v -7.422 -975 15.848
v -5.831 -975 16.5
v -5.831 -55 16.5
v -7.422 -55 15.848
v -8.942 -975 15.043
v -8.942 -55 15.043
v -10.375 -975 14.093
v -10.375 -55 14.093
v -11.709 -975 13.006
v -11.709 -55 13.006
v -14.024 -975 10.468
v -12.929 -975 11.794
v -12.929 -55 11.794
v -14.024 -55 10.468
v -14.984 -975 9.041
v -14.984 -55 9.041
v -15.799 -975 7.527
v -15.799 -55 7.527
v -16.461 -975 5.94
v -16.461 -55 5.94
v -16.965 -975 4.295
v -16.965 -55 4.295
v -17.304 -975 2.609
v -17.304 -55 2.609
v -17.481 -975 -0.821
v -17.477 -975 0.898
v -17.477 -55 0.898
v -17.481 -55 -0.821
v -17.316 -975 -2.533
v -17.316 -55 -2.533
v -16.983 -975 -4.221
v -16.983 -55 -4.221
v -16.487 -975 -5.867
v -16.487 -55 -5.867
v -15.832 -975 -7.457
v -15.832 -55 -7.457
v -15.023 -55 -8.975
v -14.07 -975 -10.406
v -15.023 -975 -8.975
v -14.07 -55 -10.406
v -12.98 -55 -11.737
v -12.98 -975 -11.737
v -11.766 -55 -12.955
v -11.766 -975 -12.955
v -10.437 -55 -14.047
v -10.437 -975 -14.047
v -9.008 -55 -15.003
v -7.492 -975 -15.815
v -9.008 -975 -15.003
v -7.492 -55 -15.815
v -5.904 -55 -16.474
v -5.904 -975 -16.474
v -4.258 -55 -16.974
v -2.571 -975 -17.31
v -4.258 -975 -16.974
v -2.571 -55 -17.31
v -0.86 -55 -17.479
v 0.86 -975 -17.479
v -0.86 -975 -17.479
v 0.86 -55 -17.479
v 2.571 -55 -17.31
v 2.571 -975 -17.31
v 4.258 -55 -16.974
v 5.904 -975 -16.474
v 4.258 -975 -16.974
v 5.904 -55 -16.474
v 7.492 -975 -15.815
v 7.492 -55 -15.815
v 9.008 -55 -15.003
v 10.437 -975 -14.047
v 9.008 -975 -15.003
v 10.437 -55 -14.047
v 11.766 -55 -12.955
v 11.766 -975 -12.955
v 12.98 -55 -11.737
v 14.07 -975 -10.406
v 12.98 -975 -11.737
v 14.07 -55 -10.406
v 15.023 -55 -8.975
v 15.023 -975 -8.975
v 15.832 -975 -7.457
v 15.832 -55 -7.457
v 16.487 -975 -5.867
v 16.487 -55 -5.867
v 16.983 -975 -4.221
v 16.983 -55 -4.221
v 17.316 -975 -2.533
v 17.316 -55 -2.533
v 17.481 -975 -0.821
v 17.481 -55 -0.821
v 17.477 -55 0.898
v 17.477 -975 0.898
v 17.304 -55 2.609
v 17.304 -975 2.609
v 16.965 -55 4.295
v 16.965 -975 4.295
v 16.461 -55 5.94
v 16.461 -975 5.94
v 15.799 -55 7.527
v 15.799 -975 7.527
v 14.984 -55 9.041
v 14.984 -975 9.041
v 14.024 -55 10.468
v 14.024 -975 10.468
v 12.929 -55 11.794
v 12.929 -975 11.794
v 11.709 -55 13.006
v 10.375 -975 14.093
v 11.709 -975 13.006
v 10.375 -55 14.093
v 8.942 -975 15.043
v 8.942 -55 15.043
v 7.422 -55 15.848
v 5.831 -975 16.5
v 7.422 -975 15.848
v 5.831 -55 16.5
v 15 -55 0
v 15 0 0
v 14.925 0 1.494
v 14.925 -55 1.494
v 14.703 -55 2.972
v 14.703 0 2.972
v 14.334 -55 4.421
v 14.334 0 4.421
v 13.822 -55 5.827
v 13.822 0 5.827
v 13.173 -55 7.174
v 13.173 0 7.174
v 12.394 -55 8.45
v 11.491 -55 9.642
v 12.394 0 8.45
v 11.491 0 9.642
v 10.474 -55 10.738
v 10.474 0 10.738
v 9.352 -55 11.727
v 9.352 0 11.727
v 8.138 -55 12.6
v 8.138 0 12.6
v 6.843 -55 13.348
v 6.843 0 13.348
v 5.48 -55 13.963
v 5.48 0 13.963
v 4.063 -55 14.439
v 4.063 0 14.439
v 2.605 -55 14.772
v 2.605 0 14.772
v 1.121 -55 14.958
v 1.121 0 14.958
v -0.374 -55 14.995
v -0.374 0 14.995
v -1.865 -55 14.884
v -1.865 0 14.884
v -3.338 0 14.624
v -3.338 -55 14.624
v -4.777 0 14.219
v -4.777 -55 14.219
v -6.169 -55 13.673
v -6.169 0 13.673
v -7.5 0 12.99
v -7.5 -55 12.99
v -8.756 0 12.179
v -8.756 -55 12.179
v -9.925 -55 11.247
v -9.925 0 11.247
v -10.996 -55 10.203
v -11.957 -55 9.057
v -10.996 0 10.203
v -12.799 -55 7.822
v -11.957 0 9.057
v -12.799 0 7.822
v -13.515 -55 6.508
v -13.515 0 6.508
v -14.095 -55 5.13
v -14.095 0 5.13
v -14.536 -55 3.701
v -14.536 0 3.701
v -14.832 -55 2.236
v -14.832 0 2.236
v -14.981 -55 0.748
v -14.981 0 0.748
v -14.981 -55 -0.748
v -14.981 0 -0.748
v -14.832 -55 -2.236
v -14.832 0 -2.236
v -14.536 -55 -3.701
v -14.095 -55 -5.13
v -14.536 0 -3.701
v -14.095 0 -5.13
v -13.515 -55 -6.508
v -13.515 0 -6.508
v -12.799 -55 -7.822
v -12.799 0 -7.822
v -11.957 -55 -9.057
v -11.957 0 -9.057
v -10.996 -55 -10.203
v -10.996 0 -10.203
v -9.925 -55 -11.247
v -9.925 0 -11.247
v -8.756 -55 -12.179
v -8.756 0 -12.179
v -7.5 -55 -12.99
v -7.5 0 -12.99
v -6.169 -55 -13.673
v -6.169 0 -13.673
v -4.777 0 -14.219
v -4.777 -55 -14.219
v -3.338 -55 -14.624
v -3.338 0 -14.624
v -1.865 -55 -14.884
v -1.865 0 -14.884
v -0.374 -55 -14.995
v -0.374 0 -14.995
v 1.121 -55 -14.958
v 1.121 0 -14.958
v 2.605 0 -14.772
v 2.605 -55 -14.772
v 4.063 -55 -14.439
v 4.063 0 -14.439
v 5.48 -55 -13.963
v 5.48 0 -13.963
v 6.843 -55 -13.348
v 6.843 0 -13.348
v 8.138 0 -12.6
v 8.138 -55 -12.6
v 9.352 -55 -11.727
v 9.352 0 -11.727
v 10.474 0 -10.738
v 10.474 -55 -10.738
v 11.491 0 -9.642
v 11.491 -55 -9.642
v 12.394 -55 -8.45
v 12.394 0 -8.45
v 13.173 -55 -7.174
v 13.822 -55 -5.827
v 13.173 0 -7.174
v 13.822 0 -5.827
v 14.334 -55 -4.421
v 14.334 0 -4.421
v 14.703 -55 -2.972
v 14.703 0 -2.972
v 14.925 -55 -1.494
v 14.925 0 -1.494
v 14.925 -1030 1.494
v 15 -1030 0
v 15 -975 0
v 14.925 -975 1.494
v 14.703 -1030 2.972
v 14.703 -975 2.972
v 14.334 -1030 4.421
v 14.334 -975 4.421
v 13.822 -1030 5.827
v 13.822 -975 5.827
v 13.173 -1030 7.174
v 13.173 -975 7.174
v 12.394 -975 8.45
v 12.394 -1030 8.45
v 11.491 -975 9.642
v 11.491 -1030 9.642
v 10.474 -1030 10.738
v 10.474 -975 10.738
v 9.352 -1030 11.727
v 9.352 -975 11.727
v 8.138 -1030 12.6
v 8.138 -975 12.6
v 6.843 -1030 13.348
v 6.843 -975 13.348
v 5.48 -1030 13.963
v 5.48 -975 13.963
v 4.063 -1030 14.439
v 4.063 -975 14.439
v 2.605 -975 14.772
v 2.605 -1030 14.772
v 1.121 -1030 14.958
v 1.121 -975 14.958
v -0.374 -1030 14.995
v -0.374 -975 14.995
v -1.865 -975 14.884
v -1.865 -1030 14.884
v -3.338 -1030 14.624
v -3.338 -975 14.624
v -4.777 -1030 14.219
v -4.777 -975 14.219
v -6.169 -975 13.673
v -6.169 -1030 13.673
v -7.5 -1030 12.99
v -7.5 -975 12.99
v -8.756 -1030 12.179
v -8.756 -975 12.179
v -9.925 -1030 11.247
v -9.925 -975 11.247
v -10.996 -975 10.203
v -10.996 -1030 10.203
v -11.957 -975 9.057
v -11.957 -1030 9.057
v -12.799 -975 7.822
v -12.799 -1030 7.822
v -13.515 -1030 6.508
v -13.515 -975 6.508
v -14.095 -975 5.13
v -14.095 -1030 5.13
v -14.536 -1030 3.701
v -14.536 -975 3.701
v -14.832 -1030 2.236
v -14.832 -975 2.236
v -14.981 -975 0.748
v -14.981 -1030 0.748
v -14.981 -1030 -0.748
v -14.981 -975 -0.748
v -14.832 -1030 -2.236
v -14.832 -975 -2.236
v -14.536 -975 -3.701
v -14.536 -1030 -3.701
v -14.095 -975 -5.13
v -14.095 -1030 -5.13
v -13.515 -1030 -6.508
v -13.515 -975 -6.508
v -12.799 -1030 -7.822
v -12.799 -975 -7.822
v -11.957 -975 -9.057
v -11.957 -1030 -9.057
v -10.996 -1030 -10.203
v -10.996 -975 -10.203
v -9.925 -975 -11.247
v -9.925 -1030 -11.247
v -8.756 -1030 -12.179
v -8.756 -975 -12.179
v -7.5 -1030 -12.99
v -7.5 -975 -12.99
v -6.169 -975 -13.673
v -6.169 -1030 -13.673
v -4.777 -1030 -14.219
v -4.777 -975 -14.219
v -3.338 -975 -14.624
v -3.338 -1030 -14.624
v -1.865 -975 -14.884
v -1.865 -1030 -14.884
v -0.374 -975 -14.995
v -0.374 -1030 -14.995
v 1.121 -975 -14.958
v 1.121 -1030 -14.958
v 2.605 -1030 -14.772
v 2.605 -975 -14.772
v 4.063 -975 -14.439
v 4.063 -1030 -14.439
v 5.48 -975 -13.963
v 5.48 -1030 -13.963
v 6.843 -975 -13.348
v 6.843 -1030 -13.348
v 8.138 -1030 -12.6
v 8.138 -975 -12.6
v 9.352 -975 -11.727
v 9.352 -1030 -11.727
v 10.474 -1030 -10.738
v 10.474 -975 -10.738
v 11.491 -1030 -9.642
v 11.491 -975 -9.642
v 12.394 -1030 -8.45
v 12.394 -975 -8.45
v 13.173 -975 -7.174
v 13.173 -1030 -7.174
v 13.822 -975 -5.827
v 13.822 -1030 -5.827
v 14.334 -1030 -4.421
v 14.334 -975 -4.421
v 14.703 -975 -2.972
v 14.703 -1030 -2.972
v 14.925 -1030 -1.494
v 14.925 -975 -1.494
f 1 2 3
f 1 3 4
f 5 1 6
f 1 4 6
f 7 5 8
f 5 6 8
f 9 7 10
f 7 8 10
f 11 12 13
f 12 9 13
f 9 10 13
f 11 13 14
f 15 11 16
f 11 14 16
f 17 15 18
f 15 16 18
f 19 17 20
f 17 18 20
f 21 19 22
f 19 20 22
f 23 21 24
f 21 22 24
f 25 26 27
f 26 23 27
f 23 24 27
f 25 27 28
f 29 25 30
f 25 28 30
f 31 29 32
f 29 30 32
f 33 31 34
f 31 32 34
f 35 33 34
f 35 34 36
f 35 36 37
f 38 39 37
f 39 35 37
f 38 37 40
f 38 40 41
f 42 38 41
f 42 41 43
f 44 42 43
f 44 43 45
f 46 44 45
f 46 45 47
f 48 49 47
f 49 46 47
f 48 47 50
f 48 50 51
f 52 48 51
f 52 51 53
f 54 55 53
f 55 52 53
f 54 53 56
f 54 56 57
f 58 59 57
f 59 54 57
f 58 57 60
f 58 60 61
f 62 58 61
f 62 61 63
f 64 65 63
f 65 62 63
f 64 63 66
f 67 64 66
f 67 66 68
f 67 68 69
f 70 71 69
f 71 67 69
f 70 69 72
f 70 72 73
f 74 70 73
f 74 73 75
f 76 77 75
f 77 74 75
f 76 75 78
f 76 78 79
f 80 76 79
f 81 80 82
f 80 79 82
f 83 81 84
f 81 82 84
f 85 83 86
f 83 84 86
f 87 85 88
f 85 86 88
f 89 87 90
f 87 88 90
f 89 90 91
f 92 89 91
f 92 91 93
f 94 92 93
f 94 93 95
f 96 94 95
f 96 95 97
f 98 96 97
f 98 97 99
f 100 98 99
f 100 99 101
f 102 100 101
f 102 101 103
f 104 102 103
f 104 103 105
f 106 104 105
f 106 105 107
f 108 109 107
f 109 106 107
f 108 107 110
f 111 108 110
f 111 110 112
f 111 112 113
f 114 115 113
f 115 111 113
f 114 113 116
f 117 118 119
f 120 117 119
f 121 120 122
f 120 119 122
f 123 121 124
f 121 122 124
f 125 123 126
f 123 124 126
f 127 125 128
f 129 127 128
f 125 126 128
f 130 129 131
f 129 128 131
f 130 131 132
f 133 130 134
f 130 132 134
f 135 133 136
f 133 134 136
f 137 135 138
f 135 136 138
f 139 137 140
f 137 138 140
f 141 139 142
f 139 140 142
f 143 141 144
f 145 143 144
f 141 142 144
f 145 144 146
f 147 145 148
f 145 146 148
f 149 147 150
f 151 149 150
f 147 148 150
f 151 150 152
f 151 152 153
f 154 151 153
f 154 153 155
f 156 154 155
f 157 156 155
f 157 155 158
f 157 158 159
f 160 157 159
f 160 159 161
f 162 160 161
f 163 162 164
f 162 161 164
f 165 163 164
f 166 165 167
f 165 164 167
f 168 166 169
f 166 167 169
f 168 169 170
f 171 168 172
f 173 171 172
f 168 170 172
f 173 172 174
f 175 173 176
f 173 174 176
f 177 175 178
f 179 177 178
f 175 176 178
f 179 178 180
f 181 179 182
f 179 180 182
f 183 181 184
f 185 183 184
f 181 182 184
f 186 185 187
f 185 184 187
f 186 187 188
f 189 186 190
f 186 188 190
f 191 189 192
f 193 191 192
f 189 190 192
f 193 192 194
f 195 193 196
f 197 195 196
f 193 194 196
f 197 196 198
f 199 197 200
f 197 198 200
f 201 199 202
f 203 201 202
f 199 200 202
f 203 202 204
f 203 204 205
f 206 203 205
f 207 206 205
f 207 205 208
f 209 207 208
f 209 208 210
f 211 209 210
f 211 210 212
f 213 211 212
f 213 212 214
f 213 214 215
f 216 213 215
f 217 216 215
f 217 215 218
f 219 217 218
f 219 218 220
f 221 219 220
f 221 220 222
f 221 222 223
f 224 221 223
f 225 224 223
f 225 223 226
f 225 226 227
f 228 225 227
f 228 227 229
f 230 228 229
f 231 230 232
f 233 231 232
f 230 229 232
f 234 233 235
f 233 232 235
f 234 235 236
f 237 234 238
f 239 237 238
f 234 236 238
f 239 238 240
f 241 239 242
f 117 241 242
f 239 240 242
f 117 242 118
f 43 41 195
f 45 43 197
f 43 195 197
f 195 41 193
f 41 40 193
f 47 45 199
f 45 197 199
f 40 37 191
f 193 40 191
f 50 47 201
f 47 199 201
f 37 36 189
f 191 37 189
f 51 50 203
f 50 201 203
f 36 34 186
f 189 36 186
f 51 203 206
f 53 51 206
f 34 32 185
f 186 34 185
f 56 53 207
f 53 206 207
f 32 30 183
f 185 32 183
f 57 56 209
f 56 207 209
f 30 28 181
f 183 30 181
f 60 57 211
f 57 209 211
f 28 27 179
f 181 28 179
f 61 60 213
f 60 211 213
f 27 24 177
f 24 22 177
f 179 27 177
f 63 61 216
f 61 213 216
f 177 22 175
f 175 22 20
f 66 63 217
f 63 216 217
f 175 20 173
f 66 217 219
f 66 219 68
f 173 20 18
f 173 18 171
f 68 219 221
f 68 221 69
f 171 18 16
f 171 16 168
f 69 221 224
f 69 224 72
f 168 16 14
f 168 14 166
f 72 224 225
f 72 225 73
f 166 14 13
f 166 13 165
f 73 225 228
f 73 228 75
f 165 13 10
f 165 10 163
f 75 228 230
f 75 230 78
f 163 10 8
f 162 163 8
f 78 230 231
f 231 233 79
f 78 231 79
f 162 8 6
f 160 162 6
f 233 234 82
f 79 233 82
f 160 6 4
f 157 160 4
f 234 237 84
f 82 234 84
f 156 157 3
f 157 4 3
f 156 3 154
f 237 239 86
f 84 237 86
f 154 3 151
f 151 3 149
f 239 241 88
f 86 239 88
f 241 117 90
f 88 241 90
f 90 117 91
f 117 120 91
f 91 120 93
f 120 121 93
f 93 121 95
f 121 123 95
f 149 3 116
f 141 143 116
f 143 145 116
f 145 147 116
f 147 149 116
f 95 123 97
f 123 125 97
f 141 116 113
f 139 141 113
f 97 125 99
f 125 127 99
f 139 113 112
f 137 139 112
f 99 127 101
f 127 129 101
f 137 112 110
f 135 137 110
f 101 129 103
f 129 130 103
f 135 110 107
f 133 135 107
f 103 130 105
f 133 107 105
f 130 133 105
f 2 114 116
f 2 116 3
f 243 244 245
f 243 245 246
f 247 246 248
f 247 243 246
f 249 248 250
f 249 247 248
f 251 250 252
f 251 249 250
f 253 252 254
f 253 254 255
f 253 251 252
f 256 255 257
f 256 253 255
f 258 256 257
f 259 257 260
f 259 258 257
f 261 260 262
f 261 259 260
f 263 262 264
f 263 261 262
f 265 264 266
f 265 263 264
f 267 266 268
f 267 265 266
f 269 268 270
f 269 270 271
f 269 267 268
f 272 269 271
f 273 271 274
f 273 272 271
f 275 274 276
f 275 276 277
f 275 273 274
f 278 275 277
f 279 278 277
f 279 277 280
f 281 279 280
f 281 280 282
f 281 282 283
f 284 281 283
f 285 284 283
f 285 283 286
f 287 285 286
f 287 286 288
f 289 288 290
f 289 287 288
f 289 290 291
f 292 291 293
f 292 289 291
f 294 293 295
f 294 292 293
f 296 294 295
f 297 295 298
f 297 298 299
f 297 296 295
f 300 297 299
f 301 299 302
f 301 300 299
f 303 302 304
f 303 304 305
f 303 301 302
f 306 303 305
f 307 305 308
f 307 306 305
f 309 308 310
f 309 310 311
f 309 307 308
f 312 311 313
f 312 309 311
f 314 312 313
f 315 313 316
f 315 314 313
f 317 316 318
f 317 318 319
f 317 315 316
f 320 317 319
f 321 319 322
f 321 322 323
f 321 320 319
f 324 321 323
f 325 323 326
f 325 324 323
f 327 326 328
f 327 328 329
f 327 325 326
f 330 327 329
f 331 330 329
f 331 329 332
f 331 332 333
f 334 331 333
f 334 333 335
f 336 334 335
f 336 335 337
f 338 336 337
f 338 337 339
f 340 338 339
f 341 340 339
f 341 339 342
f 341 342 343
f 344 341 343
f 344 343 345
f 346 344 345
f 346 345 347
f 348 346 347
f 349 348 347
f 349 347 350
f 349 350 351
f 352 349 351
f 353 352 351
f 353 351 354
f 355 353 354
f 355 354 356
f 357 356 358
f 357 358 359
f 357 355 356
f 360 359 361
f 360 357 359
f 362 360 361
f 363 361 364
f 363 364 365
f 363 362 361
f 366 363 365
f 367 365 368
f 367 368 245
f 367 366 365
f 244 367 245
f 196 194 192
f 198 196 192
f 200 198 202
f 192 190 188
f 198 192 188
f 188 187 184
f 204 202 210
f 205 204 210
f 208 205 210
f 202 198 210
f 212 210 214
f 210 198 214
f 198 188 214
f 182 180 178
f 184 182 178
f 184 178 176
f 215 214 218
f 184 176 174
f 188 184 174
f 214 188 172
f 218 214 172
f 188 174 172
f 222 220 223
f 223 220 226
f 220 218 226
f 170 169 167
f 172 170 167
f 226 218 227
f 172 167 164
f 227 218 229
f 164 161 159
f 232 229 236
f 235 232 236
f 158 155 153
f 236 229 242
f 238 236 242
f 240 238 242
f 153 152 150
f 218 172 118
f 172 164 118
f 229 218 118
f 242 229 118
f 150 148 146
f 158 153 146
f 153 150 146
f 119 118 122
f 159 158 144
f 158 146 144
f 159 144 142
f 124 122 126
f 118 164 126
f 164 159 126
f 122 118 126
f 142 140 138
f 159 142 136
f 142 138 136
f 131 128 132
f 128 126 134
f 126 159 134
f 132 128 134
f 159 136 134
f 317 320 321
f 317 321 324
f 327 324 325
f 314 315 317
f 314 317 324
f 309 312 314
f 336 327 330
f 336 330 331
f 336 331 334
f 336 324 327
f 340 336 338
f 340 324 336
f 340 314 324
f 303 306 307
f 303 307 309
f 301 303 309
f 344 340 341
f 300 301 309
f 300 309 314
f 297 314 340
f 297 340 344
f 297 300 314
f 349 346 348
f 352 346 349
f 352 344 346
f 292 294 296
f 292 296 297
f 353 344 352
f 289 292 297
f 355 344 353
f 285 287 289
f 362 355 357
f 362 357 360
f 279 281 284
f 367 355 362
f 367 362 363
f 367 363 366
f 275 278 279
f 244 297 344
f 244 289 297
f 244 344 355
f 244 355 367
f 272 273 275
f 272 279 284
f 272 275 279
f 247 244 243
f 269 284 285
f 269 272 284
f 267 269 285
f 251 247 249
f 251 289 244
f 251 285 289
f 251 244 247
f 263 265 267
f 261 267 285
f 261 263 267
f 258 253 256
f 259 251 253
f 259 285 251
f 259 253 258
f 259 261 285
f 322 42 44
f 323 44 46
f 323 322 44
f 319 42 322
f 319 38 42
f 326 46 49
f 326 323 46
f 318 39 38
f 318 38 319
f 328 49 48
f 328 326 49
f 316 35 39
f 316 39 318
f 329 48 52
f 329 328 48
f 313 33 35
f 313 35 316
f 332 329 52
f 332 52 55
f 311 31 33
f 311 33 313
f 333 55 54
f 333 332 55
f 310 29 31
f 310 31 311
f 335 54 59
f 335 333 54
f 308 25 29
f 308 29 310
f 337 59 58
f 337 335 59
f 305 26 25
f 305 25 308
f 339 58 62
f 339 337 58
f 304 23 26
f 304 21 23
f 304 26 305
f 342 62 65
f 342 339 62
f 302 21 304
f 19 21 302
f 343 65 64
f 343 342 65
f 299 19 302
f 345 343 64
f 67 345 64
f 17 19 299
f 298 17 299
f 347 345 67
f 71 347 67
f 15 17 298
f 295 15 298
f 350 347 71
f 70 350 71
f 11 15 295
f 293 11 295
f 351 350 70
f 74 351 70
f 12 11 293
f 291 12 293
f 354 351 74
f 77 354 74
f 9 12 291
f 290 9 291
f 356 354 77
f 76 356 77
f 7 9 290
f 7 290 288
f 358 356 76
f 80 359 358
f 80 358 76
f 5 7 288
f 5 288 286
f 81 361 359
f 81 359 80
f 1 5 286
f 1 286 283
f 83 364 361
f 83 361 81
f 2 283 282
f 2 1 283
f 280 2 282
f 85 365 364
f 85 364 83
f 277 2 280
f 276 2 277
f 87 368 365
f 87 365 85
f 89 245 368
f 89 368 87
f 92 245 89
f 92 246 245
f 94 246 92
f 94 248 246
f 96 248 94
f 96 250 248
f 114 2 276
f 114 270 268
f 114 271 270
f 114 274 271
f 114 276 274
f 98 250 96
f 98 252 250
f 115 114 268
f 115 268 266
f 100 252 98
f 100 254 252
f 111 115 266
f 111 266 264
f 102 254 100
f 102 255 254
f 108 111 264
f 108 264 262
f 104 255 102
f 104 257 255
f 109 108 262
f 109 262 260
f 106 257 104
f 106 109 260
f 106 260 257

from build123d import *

# Parameters (mm, degrees)
F1_DEPTH = 1030
F2_R     = 17.5
F2_R_2   = 15
F3_DEPTH = 55
F4_R     = 17.5
F4_R_2   = 15
F5_DEPTH = 55


with BuildPart() as f1:
    # F0 (on Front) → F1 (new body)
    with BuildSketch(Plane.XZ):
        with BuildLine():
            Line((5.830952, 16.5), (-5.830952, 16.5))
            ThreePointArc((-5.830952, 16.5), (0, -17.5), (5.830952, 16.5))
        make_face()
    extrude(amount=F1_DEPTH)

    # F2 (on Front) → F3 (cut)
    with BuildSketch(Plane.XZ):
        Circle(F2_R)
        Circle(F2_R_2, mode=Mode.SUBTRACT)
    extrude(amount=F3_DEPTH, mode=Mode.SUBTRACT)

    # F4 (on face) → F5 (cut)
    with BuildSketch(Plane.XZ.offset(1030)):
        Circle(F4_R)
        Circle(F4_R_2, mode=Mode.SUBTRACT)
    extrude(amount=-F5_DEPTH, mode=Mode.SUBTRACT)


solid = f1.part
